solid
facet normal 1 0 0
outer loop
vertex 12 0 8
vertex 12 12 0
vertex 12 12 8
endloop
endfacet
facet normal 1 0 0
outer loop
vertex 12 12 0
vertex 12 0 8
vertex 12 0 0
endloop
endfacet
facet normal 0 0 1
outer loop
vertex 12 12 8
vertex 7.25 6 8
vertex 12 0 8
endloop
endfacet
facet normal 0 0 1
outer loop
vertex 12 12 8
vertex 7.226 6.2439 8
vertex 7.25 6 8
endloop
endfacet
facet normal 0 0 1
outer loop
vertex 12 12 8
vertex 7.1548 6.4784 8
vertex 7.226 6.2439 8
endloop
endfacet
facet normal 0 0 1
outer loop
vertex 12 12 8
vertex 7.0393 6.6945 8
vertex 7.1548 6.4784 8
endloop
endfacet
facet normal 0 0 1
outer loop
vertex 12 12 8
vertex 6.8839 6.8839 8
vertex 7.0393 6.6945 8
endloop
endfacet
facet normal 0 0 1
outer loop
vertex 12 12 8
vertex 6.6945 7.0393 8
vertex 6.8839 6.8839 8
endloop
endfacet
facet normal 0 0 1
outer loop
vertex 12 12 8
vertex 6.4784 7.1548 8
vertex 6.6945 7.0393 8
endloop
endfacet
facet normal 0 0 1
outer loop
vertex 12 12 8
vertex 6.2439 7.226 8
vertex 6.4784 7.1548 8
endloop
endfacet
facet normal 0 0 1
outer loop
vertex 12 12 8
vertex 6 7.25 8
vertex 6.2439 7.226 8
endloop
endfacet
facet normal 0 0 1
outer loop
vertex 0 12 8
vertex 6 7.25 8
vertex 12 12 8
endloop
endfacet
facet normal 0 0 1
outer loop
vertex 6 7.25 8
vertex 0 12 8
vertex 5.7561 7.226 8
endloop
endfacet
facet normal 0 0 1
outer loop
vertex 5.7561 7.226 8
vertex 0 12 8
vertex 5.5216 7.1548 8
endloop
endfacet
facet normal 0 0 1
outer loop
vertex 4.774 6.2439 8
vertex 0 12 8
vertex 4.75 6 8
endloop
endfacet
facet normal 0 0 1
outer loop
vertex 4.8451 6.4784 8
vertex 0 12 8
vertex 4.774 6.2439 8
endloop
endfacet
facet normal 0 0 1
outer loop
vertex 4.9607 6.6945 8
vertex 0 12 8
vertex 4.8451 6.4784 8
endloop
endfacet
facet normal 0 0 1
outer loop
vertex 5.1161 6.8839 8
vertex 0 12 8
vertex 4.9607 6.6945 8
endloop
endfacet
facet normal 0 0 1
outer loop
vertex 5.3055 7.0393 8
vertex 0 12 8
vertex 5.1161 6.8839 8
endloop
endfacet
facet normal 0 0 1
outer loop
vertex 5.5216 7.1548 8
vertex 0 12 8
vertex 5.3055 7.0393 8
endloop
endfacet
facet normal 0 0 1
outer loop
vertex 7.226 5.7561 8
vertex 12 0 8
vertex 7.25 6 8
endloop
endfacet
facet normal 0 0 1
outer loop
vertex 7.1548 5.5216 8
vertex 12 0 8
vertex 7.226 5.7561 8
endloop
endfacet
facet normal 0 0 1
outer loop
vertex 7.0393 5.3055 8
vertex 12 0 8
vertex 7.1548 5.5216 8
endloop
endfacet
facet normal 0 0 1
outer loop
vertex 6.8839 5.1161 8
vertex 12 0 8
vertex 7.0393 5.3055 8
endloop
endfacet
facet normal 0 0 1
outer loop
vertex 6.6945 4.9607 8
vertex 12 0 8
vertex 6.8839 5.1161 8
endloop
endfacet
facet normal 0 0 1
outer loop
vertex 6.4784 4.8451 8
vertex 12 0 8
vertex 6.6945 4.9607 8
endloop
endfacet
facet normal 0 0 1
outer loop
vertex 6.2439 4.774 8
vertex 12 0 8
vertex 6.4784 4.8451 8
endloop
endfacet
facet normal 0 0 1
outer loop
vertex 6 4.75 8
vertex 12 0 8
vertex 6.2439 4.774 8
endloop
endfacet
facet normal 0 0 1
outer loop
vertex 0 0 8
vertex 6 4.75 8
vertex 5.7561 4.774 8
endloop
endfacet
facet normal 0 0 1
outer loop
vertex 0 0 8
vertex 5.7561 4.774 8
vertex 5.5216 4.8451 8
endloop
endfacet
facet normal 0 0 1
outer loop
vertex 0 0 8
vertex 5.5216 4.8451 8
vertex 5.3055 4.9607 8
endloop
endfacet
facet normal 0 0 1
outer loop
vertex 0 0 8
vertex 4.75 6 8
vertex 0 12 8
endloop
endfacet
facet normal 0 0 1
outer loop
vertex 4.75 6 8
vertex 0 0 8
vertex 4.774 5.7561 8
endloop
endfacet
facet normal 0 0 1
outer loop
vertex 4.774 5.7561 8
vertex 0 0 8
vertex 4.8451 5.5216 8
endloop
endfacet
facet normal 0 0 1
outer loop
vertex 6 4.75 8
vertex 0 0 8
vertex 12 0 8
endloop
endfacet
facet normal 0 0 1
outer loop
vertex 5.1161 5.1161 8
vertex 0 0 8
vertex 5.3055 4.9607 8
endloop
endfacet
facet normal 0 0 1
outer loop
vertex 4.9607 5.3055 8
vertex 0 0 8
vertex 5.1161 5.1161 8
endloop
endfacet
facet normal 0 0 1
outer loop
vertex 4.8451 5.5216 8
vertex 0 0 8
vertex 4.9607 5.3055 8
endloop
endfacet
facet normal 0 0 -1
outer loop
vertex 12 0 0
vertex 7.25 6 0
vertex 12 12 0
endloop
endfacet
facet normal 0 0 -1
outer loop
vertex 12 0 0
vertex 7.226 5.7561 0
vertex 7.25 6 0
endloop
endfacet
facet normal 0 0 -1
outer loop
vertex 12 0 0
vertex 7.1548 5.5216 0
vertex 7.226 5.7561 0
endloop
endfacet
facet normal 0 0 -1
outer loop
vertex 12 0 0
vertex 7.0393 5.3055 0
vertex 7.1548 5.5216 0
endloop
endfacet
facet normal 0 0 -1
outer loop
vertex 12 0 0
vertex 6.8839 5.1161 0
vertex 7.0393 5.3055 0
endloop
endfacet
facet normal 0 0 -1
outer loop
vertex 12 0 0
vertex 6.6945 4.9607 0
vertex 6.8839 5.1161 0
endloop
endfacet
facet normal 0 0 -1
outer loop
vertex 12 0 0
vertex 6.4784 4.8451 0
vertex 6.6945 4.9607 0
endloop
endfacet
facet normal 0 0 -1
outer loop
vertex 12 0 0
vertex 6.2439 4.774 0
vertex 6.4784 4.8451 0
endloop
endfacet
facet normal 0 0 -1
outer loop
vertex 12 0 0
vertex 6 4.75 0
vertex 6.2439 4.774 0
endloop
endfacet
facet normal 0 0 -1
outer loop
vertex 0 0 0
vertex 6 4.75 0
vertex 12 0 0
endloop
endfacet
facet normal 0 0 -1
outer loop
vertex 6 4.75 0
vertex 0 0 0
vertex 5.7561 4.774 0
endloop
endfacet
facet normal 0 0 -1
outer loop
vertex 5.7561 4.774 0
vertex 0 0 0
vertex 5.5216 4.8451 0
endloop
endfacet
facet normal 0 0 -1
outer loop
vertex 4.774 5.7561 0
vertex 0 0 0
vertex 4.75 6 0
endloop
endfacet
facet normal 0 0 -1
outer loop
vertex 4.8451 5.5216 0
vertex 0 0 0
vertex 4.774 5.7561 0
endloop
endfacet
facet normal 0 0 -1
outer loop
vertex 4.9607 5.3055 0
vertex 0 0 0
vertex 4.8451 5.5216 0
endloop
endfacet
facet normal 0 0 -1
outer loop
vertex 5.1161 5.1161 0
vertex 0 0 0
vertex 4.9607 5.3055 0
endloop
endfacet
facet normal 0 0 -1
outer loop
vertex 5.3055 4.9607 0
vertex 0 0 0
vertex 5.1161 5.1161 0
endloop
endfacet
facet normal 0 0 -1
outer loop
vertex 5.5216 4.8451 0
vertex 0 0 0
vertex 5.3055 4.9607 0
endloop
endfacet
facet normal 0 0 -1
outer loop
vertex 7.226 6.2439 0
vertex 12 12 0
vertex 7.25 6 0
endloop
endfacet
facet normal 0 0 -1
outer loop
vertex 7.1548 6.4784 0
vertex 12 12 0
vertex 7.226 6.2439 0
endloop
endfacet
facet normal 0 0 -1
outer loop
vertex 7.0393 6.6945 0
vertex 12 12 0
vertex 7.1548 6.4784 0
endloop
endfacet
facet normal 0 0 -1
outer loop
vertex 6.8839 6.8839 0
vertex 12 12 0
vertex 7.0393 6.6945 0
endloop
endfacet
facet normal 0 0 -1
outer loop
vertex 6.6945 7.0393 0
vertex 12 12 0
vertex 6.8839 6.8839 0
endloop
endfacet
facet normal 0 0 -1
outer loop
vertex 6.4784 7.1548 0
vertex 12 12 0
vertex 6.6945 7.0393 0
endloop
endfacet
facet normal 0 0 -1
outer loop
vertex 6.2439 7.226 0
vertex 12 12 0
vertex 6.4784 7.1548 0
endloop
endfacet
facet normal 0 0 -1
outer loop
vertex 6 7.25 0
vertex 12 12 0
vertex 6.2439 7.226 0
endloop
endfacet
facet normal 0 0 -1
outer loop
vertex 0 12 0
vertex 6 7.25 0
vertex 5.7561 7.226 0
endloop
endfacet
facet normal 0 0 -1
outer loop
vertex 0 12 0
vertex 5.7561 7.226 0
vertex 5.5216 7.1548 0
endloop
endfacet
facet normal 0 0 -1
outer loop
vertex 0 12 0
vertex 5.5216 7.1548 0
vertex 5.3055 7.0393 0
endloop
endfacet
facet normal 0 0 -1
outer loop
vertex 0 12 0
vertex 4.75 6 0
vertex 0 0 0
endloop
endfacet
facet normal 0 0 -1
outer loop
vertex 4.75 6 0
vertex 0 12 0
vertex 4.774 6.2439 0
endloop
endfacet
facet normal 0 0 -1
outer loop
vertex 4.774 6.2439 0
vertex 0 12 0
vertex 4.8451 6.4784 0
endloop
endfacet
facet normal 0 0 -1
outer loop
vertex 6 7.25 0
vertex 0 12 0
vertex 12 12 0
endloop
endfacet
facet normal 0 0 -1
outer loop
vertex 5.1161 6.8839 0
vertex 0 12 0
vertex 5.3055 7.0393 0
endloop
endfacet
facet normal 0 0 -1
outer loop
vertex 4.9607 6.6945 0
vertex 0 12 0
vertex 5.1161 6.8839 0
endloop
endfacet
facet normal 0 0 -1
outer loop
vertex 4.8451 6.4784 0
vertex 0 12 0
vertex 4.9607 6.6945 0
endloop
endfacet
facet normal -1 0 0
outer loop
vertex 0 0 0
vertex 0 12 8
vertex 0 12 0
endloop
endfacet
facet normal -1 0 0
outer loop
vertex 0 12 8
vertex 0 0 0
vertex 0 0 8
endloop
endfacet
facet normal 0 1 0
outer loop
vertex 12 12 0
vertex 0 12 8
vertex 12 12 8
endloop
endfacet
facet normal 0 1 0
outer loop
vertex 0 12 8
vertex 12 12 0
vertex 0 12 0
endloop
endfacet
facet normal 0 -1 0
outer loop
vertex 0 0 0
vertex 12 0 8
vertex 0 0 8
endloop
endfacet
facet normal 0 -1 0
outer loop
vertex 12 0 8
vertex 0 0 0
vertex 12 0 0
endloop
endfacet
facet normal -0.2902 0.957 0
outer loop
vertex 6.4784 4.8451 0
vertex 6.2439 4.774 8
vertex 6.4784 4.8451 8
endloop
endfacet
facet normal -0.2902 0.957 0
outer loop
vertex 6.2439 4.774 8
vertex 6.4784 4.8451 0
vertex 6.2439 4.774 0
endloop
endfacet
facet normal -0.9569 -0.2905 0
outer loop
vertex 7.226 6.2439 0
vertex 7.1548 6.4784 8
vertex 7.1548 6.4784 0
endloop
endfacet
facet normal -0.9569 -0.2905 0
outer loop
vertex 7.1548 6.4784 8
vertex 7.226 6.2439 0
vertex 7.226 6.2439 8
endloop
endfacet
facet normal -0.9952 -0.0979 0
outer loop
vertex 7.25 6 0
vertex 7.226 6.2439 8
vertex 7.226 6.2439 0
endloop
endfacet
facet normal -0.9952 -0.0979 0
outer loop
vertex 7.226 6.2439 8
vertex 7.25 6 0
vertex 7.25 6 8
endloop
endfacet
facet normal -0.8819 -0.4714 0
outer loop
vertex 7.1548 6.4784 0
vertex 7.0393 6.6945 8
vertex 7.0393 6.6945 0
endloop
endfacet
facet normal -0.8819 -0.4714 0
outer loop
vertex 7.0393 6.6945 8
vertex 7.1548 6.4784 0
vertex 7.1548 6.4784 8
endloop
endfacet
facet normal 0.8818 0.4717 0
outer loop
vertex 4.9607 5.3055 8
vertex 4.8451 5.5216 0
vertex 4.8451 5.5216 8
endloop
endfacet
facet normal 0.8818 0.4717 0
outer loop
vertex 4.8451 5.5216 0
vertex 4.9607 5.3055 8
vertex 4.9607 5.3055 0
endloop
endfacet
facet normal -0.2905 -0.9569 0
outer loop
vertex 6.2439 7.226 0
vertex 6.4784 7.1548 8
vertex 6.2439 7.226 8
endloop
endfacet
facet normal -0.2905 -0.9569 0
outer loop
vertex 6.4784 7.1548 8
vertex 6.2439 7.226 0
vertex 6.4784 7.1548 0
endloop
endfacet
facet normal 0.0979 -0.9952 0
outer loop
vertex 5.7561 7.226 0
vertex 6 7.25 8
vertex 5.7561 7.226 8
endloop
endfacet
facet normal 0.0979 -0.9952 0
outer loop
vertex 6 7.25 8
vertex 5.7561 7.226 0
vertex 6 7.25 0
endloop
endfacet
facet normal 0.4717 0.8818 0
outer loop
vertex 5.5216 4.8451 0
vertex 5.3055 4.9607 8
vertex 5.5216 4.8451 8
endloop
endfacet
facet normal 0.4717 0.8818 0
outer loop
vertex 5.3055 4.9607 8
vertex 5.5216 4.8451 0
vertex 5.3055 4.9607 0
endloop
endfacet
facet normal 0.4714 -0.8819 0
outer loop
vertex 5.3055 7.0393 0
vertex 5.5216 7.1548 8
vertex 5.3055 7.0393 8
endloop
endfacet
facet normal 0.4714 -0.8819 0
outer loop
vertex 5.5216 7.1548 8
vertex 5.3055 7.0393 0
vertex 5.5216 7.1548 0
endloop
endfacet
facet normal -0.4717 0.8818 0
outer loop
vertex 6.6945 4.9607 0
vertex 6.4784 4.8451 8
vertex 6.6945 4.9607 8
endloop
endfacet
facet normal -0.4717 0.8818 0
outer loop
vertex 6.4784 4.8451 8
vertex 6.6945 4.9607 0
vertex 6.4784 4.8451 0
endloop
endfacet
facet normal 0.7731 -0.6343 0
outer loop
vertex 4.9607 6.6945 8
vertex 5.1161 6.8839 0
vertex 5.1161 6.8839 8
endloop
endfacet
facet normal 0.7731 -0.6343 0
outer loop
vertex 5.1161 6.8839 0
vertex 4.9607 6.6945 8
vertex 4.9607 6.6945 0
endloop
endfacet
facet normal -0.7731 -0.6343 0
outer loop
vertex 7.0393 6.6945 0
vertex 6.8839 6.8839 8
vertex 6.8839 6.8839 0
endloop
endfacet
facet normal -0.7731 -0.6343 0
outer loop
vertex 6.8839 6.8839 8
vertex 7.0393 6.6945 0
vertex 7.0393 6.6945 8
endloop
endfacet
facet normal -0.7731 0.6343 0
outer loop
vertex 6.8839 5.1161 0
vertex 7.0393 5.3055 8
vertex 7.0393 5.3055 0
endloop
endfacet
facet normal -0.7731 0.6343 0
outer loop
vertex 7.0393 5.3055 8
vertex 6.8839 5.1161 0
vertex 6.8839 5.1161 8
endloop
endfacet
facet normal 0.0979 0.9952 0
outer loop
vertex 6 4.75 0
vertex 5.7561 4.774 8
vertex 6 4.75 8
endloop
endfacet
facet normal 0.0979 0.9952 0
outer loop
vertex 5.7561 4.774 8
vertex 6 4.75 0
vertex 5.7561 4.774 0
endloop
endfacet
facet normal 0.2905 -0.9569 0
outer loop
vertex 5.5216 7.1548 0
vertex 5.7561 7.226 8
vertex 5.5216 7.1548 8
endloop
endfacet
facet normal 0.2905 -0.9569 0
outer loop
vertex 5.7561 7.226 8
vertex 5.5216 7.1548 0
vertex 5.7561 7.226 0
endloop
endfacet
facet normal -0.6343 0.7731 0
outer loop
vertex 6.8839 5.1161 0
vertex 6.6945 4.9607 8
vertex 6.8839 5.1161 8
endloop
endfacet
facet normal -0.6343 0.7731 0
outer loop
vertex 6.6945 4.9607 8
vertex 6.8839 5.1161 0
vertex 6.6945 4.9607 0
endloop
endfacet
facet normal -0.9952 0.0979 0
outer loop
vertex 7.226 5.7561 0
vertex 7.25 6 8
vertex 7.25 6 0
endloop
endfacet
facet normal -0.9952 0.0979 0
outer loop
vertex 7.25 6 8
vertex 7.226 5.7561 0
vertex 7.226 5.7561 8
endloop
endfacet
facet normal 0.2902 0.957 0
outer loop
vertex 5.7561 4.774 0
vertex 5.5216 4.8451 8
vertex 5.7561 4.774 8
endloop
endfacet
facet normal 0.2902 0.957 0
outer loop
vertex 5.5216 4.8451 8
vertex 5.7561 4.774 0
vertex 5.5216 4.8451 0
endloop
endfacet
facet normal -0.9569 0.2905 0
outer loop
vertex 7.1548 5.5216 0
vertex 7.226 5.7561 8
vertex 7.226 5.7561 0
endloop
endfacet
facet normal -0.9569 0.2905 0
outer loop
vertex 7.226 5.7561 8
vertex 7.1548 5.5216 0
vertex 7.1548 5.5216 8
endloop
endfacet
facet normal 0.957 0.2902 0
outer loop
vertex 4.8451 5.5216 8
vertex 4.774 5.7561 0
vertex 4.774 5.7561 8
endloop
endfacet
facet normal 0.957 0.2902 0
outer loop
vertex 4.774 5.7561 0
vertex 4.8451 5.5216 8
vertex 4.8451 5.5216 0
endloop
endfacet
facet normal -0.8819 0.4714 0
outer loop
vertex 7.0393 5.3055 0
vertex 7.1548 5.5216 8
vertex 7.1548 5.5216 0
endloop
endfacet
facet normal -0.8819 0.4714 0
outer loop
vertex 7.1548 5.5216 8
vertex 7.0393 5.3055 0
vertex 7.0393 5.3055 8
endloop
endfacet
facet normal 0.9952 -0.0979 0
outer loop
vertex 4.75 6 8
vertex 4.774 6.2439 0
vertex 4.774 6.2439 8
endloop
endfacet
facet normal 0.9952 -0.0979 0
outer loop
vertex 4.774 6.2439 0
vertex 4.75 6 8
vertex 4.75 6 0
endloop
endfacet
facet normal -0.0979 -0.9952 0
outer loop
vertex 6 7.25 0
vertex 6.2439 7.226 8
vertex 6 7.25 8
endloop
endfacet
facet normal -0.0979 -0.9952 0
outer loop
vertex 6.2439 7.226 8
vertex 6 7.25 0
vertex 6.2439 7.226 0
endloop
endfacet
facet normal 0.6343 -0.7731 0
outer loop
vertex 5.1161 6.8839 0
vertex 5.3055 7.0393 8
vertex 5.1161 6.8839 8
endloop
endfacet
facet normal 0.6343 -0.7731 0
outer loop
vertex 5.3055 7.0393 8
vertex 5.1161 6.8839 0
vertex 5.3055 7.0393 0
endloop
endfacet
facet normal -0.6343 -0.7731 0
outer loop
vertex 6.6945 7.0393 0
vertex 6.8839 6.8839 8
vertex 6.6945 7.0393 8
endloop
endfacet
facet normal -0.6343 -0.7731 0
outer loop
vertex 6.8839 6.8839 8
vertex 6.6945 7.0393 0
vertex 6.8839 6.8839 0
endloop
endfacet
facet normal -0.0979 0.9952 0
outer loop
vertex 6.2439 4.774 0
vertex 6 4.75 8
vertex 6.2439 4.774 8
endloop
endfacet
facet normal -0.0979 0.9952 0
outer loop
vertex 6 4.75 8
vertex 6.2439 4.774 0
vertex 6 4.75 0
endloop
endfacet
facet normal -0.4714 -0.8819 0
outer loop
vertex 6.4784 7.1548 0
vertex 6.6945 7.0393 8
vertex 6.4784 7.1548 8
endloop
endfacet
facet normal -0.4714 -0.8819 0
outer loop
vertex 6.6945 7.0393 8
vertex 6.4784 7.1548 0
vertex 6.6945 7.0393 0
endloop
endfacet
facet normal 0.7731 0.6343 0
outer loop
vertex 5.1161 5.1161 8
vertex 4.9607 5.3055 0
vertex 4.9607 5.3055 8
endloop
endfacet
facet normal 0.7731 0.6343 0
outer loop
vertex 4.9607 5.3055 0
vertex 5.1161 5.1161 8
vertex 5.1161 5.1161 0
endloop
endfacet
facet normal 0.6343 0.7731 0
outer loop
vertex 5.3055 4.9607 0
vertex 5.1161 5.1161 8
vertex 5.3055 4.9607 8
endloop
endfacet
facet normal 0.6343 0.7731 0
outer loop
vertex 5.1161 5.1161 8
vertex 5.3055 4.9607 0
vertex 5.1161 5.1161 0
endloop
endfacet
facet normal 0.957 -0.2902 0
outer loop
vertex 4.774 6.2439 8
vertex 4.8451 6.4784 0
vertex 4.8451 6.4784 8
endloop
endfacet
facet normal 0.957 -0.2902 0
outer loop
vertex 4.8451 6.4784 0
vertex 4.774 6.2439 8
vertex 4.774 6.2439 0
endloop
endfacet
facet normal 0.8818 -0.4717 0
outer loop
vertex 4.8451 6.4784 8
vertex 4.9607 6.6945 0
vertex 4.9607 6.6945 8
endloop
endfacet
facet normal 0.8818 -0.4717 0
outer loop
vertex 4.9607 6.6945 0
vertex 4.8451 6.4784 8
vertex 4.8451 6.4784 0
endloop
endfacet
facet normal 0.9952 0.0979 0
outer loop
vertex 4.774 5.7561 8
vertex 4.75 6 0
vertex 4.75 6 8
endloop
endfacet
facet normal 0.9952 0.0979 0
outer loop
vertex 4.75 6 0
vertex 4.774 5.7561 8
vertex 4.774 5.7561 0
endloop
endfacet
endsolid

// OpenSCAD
$fn = 32;

// ----------------------------------------------------------------------
// Micro pad: drilled pad, 5-20 mm class
// ----------------------------------------------------------------------

// --- parameters (mm) ---
pad_l = 12;               // pad length, X
pad_w = 12;               // pad width, Y
pad_t = 8;                // pad thickness, Z
hole_d = 2.5;             // through hole diameter

difference() {
  cube([pad_l, pad_w, pad_t]);
  translate([pad_l / 2, pad_w / 2, -1])
    cylinder(h = pad_t + 2, d = hole_d);
}
